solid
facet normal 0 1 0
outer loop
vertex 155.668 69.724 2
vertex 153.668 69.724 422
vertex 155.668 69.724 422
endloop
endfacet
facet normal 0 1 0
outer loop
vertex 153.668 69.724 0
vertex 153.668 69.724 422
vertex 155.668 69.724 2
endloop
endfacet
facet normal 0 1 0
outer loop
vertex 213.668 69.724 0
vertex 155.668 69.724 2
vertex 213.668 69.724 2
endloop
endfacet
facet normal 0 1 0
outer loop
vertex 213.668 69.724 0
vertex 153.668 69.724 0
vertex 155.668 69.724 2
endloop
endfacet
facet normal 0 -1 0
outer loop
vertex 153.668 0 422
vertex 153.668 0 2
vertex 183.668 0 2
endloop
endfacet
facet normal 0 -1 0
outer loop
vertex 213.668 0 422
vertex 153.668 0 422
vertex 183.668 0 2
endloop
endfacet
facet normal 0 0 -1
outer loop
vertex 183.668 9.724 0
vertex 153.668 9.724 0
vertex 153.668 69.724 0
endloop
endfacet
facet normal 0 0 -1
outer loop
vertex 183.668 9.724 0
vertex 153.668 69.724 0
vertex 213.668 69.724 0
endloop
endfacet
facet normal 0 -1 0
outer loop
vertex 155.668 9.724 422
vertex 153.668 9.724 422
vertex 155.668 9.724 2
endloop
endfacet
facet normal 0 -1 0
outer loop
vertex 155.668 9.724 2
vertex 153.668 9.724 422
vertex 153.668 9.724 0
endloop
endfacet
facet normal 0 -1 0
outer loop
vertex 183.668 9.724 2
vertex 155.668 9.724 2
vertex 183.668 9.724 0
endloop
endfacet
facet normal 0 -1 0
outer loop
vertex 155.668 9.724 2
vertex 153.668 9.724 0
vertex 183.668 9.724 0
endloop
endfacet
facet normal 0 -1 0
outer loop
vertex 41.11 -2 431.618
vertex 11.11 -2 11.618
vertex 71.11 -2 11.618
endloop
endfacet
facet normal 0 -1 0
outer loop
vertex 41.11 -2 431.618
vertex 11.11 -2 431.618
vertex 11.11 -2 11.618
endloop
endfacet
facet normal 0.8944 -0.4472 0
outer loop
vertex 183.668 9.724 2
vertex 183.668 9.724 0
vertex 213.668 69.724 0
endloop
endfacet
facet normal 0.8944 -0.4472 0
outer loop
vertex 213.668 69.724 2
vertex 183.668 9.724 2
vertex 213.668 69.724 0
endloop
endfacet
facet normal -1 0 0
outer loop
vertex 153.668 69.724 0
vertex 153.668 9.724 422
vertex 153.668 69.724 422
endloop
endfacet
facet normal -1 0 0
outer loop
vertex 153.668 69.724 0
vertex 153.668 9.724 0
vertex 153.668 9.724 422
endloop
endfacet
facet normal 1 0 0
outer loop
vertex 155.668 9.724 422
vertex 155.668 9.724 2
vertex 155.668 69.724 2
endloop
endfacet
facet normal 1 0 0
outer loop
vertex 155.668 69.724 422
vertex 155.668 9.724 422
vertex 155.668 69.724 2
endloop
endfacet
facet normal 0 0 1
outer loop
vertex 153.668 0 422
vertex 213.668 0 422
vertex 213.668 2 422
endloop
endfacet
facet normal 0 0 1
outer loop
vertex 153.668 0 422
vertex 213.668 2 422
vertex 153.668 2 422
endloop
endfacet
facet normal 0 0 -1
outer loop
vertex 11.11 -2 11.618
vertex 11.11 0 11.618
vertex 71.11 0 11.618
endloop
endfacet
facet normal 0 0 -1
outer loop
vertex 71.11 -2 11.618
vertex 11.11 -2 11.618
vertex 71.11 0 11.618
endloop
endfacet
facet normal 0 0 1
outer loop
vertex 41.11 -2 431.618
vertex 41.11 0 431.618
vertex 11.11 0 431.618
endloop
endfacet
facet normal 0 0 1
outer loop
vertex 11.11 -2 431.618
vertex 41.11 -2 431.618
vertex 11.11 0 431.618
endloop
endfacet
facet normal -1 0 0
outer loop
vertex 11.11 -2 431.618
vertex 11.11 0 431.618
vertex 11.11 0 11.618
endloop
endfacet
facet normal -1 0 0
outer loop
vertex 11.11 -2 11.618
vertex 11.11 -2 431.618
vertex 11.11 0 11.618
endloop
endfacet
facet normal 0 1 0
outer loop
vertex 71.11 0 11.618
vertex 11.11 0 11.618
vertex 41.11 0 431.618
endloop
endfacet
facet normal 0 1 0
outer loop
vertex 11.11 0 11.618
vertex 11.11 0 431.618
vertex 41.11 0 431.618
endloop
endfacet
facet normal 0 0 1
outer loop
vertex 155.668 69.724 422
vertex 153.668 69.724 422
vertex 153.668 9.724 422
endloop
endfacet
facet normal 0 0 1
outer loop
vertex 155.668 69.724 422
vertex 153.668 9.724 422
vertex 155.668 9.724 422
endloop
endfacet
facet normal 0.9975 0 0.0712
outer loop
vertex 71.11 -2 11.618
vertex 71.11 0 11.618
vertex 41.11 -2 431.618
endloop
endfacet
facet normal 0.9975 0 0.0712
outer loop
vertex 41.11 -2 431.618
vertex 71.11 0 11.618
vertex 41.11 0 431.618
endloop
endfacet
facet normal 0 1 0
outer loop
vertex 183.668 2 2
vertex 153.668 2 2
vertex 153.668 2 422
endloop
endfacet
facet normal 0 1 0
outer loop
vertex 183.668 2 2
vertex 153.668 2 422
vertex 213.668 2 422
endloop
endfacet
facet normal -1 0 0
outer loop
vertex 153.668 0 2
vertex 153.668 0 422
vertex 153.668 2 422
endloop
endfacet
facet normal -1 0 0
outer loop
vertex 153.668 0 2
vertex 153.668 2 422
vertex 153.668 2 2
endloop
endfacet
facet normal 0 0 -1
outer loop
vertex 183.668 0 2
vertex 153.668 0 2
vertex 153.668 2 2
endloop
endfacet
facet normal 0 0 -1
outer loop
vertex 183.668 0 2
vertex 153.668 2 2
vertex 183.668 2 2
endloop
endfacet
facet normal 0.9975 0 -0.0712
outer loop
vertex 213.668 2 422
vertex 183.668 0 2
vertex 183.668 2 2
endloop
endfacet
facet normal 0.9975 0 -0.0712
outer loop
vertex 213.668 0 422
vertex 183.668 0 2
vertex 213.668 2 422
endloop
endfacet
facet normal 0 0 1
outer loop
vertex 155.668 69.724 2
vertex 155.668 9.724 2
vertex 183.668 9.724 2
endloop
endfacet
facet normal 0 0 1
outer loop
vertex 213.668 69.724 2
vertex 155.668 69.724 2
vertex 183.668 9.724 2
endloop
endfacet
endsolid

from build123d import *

# Parameters (mm, degrees)
F1_DEPTH = 2
F3_DEPTH = 2
F5_DEPTH = 2
F6_W     = 2
F6_H     = 60
F7_DEPTH = 420


with BuildPart() as f1:
    # F0 (on Top) → F1 (new body)
    with BuildSketch(Plane.XY):
        Polygon((213.668106, 69.724469), (153.668106, 69.724469), (153.668106, 9.724469), (183.668106, 9.724469), align=None)
    extrude(amount=F1_DEPTH)

    # F6 (on face) → F7 (join)
    with BuildSketch(Plane.XY.offset(2)):
        with Locations((154.668106, 39.724469)):
            Rectangle(F6_W, F6_H)
    extrude(amount=F7_DEPTH)


with BuildPart() as f3:
    # F2 (on Front) → F3 (new body)
    with BuildSketch(Plane.XZ):
        Polygon((153.668106, 2), (183.668106, 2), (213.668106, 422), (153.668106, 422), align=None)
    extrude(amount=-F3_DEPTH)


with BuildPart() as f5:
    # F4 (on Front) → F5 (new body)
    with BuildSketch(Plane.XZ):
        Polygon((11.109603, 11.618226), (71.109603, 11.618226), (41.109603, 431.618226), (11.109603, 431.618226), align=None)
    extrude(amount=F5_DEPTH)


solid = Compound([f1.part, f3.part, f5.part])
